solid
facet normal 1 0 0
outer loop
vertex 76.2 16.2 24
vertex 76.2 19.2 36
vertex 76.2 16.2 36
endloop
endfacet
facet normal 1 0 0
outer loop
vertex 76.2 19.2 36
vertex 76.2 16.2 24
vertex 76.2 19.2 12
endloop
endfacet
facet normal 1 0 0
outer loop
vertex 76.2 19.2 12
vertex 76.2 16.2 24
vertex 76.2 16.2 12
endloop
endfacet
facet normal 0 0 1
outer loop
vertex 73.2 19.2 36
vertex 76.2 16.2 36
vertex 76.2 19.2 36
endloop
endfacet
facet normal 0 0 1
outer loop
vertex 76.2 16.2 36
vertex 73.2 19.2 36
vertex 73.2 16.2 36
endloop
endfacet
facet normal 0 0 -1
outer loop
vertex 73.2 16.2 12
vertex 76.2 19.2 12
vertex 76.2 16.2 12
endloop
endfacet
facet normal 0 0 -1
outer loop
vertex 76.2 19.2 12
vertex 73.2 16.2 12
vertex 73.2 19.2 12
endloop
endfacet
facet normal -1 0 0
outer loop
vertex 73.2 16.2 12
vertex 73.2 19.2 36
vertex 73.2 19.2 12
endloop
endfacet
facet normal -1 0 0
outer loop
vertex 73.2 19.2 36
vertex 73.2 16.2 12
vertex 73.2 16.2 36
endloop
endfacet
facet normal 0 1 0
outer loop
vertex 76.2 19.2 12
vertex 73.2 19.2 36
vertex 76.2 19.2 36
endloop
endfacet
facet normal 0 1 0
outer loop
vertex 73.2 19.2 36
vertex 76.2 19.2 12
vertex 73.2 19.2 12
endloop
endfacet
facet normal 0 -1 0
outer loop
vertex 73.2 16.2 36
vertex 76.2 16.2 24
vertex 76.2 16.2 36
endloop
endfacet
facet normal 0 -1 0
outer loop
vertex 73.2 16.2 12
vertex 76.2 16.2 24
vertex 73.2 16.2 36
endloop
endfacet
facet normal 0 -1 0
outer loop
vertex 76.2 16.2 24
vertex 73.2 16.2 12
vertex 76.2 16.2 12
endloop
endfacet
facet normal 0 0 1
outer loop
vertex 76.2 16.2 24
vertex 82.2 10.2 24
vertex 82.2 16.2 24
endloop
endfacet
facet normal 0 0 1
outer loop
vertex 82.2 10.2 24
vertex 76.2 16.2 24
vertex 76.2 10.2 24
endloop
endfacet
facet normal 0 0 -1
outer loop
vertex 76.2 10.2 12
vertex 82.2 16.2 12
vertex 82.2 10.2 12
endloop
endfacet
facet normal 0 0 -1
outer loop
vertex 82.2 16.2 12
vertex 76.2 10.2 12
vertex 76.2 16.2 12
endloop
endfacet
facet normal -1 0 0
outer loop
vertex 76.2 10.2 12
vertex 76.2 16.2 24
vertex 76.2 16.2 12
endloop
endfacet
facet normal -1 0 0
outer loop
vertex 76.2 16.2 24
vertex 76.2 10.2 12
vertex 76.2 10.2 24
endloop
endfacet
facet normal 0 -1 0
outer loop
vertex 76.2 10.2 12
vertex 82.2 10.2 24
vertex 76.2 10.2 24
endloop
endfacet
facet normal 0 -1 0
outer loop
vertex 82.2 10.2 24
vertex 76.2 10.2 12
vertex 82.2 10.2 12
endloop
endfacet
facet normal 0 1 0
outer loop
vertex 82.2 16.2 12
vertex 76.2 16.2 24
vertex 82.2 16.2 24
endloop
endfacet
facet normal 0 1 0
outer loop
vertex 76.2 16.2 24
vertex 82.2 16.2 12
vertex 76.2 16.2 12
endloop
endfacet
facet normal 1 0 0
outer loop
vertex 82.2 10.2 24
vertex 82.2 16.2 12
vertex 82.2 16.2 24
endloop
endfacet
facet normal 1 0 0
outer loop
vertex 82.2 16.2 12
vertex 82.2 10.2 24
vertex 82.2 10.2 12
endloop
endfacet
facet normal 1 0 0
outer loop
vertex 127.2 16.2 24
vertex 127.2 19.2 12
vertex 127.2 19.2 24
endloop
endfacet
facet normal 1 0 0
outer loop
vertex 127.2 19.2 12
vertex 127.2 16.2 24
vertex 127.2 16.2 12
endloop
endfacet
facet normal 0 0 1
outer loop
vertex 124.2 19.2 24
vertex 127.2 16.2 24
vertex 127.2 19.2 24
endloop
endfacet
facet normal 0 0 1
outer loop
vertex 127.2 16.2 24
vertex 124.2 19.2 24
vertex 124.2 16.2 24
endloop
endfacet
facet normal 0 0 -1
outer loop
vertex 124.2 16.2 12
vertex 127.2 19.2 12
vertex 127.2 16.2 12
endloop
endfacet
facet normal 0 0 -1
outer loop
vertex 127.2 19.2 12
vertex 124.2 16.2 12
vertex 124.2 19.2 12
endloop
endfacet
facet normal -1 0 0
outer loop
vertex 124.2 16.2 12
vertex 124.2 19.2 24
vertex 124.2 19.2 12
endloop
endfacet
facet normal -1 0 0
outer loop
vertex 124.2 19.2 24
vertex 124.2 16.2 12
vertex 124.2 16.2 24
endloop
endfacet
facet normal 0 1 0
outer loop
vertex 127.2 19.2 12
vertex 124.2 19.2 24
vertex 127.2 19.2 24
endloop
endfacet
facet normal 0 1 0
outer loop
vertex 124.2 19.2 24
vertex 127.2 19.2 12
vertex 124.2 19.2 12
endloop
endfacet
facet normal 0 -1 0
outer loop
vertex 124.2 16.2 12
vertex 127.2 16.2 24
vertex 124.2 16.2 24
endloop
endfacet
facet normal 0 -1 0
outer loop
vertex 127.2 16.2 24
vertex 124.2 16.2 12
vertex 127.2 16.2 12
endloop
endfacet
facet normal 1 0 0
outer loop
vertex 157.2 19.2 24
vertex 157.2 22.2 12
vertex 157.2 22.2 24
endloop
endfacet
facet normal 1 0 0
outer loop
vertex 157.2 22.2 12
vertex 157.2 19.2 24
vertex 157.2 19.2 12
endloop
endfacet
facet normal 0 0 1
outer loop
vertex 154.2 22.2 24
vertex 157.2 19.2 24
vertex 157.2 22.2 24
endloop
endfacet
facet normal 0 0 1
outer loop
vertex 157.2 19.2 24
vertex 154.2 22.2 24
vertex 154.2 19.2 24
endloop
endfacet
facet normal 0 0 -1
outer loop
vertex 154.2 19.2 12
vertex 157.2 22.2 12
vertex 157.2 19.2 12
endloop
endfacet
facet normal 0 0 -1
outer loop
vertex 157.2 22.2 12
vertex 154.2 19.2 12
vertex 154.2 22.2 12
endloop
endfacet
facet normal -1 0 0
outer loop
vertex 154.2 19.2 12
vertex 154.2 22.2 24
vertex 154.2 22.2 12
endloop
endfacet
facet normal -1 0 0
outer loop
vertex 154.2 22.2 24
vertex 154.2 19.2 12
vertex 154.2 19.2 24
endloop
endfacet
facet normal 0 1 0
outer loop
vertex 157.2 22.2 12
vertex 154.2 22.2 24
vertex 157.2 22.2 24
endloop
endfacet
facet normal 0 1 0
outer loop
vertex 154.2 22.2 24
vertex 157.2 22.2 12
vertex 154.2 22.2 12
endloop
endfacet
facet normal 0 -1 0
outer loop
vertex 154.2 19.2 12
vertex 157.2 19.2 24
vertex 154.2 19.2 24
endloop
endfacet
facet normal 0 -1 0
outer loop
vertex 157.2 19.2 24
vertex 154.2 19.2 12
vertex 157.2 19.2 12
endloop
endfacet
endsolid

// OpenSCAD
union() {
	translate(v = [73.2, 16.200000000000003, 12.0]) {
		cube(size = [3.0, 3.0, 24.0]);
	}
	translate(v = [76.2, 10.200000000000001, 12.0]) {
		cube(size = [3.0, 3.0, 12.0]);
	}
	translate(v = [76.2, 13.200000000000001, 12.0]) {
		cube(size = [3.0, 3.0, 12.0]);
	}
	translate(v = [79.2, 10.200000000000001, 12.0]) {
		cube(size = [3.0, 3.0, 12.0]);
	}
	translate(v = [79.2, 13.200000000000001, 12.0]) {
		cube(size = [3.0, 3.0, 12.0]);
	}
	translate(v = [124.2, 16.200000000000003, 12.0]) {
		cube(size = [3.0, 3.0, 12.0]);
	}
	translate(v = [154.2, 19.200000000000003, 12.0]) {
		cube(size = [3.0, 3.0, 12.0]);
	}
}
